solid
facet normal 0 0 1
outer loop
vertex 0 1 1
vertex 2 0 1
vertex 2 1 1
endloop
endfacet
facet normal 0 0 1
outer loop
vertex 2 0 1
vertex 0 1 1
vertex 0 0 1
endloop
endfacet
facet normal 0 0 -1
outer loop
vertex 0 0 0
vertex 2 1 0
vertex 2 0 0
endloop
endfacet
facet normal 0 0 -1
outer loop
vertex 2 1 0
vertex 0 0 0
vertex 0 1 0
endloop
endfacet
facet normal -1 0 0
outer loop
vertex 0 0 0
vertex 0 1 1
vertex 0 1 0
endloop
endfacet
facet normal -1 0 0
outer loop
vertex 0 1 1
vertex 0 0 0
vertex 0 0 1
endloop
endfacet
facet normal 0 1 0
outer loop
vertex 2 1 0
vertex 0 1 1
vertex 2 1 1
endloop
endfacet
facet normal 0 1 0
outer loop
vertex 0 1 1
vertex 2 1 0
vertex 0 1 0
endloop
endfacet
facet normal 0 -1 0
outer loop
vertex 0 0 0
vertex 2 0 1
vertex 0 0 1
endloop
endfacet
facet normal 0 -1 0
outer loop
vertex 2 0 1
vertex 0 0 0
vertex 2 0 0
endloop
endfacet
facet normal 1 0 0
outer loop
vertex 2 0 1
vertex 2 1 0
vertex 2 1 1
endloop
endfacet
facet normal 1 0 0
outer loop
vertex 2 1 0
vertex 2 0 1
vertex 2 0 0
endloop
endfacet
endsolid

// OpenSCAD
echo([for(i=[0:0.1:0.3]) i], [for(i=[0.3:-0.1:0]) i], [for(i=[0:0.1:0.7]) i]);
echo([for(i=[0:1:2.9999999999999996]) i], [for(i=[0:1:2.999999999999999]) i]);
echo([for(i=[1:0:1]) i], [for(i=[5:0:0]) i], [for(i=[1:1/0:1]) i], [for(i=[0:1/0:5]) i], [for(i=[0:-1/0:5]) i], [for(i=[5:-1/0:0]) i]);
echo(1/[for(i=[-0:1:2]) i][0], [for(i=[0:1:0/0]) i], [for(i=[0/0:1:2]) i], [for(i=[1e300:1e300:2e300]) i], len([for(i=[0:1e-300:1e-299]) i]));
echo([for(i=[0:0.1:1]) i][10] == 1, [for(i=[0:0.1:1]) i][7] == 0.1*7);
echo([1:0:1], [0:1/3:1], [-0:1:2], [0:1:0/0], [1e300:1e300:2e300]);
r0 = [0:0:5];
echo(r0, [for(i=r0) i], [each r0], len([for(i=r0) i]));
for (i=[0:0:1]) cube();
for (i=[1:0:1]) sphere();
echo([for(i=[0:1:4294967298]) i], [for(i=[0:1:4294967300]) i], [for(i=[10:-1:10-4294967300]) i]);
echo([for(i=[0:1:1e19]) i], [for(i=[0:1:9.3e18]) i]);
echo([for(i=[-1e308:1:1e308]) i], [for(i=[-1/0:1/0:1/0]) i], [for(i=[1/0:-1:1/0]) i]);
for (i=[0:1:4294967298]) translate([i,0,0]) cube();
r = [0:2:10];
echo(r[0], r[1], r[2], r[3], r[-1], r[1.5], len(r));
echo(r == [0:2:11], r == [0:2:12], [5:1:0] == [6:1:0], [0:1:0] == [0:5:0], [0/0:1:2] == [0/0:1:3], [1:0:1] == [1:0:5], [0:0:5] == [0:0:6], [0:2:10] == [0,2,4,6,8,10]);
echo([0:1:2] < [0:1:3], [0:1:2] < [0:1:2.5], [0:1:2] <= [0:1:2.5], [0:2:2] < [0:1:2], [0:1:2] < [0:2:2], [1:1:2] < [0:1:3]);
echo([5:1:0] < [0:1:2], [0:1:2] < [5:1:0], [5:1:0] < [6:1:0], [5:1:0] <= [6:1:0], [5:1:0] >= [6:1:0], [0:1:5] > [0:1:3], [0:1:2] != [0:1:2.5]);
echo(r + 1, -r, r * 2, [0:1:2] < 5, [5:1:0] ? "t" : "f", concat(r), [for(x=[r]) for(y=x) y]);
echo([0:"a":5], ["a":1:2], [0:1:"a"], [true:1:2], [undef:1:2], [0:undef:2], [0:true]);
echo([let(a=echo("B")) 0 : let(b=echo("S")) 1 : let(c=echo("E")) 2]);
echo([let(a=echo("B2")) "x" : let(b=echo("S2")) 1 : let(c=echo("E2")) 2]);
echo([let(a=echo("B4")) 0 : let(b=echo("E4")) 1]);
echo(1, 5e-324, 2, 1e309, 3);
